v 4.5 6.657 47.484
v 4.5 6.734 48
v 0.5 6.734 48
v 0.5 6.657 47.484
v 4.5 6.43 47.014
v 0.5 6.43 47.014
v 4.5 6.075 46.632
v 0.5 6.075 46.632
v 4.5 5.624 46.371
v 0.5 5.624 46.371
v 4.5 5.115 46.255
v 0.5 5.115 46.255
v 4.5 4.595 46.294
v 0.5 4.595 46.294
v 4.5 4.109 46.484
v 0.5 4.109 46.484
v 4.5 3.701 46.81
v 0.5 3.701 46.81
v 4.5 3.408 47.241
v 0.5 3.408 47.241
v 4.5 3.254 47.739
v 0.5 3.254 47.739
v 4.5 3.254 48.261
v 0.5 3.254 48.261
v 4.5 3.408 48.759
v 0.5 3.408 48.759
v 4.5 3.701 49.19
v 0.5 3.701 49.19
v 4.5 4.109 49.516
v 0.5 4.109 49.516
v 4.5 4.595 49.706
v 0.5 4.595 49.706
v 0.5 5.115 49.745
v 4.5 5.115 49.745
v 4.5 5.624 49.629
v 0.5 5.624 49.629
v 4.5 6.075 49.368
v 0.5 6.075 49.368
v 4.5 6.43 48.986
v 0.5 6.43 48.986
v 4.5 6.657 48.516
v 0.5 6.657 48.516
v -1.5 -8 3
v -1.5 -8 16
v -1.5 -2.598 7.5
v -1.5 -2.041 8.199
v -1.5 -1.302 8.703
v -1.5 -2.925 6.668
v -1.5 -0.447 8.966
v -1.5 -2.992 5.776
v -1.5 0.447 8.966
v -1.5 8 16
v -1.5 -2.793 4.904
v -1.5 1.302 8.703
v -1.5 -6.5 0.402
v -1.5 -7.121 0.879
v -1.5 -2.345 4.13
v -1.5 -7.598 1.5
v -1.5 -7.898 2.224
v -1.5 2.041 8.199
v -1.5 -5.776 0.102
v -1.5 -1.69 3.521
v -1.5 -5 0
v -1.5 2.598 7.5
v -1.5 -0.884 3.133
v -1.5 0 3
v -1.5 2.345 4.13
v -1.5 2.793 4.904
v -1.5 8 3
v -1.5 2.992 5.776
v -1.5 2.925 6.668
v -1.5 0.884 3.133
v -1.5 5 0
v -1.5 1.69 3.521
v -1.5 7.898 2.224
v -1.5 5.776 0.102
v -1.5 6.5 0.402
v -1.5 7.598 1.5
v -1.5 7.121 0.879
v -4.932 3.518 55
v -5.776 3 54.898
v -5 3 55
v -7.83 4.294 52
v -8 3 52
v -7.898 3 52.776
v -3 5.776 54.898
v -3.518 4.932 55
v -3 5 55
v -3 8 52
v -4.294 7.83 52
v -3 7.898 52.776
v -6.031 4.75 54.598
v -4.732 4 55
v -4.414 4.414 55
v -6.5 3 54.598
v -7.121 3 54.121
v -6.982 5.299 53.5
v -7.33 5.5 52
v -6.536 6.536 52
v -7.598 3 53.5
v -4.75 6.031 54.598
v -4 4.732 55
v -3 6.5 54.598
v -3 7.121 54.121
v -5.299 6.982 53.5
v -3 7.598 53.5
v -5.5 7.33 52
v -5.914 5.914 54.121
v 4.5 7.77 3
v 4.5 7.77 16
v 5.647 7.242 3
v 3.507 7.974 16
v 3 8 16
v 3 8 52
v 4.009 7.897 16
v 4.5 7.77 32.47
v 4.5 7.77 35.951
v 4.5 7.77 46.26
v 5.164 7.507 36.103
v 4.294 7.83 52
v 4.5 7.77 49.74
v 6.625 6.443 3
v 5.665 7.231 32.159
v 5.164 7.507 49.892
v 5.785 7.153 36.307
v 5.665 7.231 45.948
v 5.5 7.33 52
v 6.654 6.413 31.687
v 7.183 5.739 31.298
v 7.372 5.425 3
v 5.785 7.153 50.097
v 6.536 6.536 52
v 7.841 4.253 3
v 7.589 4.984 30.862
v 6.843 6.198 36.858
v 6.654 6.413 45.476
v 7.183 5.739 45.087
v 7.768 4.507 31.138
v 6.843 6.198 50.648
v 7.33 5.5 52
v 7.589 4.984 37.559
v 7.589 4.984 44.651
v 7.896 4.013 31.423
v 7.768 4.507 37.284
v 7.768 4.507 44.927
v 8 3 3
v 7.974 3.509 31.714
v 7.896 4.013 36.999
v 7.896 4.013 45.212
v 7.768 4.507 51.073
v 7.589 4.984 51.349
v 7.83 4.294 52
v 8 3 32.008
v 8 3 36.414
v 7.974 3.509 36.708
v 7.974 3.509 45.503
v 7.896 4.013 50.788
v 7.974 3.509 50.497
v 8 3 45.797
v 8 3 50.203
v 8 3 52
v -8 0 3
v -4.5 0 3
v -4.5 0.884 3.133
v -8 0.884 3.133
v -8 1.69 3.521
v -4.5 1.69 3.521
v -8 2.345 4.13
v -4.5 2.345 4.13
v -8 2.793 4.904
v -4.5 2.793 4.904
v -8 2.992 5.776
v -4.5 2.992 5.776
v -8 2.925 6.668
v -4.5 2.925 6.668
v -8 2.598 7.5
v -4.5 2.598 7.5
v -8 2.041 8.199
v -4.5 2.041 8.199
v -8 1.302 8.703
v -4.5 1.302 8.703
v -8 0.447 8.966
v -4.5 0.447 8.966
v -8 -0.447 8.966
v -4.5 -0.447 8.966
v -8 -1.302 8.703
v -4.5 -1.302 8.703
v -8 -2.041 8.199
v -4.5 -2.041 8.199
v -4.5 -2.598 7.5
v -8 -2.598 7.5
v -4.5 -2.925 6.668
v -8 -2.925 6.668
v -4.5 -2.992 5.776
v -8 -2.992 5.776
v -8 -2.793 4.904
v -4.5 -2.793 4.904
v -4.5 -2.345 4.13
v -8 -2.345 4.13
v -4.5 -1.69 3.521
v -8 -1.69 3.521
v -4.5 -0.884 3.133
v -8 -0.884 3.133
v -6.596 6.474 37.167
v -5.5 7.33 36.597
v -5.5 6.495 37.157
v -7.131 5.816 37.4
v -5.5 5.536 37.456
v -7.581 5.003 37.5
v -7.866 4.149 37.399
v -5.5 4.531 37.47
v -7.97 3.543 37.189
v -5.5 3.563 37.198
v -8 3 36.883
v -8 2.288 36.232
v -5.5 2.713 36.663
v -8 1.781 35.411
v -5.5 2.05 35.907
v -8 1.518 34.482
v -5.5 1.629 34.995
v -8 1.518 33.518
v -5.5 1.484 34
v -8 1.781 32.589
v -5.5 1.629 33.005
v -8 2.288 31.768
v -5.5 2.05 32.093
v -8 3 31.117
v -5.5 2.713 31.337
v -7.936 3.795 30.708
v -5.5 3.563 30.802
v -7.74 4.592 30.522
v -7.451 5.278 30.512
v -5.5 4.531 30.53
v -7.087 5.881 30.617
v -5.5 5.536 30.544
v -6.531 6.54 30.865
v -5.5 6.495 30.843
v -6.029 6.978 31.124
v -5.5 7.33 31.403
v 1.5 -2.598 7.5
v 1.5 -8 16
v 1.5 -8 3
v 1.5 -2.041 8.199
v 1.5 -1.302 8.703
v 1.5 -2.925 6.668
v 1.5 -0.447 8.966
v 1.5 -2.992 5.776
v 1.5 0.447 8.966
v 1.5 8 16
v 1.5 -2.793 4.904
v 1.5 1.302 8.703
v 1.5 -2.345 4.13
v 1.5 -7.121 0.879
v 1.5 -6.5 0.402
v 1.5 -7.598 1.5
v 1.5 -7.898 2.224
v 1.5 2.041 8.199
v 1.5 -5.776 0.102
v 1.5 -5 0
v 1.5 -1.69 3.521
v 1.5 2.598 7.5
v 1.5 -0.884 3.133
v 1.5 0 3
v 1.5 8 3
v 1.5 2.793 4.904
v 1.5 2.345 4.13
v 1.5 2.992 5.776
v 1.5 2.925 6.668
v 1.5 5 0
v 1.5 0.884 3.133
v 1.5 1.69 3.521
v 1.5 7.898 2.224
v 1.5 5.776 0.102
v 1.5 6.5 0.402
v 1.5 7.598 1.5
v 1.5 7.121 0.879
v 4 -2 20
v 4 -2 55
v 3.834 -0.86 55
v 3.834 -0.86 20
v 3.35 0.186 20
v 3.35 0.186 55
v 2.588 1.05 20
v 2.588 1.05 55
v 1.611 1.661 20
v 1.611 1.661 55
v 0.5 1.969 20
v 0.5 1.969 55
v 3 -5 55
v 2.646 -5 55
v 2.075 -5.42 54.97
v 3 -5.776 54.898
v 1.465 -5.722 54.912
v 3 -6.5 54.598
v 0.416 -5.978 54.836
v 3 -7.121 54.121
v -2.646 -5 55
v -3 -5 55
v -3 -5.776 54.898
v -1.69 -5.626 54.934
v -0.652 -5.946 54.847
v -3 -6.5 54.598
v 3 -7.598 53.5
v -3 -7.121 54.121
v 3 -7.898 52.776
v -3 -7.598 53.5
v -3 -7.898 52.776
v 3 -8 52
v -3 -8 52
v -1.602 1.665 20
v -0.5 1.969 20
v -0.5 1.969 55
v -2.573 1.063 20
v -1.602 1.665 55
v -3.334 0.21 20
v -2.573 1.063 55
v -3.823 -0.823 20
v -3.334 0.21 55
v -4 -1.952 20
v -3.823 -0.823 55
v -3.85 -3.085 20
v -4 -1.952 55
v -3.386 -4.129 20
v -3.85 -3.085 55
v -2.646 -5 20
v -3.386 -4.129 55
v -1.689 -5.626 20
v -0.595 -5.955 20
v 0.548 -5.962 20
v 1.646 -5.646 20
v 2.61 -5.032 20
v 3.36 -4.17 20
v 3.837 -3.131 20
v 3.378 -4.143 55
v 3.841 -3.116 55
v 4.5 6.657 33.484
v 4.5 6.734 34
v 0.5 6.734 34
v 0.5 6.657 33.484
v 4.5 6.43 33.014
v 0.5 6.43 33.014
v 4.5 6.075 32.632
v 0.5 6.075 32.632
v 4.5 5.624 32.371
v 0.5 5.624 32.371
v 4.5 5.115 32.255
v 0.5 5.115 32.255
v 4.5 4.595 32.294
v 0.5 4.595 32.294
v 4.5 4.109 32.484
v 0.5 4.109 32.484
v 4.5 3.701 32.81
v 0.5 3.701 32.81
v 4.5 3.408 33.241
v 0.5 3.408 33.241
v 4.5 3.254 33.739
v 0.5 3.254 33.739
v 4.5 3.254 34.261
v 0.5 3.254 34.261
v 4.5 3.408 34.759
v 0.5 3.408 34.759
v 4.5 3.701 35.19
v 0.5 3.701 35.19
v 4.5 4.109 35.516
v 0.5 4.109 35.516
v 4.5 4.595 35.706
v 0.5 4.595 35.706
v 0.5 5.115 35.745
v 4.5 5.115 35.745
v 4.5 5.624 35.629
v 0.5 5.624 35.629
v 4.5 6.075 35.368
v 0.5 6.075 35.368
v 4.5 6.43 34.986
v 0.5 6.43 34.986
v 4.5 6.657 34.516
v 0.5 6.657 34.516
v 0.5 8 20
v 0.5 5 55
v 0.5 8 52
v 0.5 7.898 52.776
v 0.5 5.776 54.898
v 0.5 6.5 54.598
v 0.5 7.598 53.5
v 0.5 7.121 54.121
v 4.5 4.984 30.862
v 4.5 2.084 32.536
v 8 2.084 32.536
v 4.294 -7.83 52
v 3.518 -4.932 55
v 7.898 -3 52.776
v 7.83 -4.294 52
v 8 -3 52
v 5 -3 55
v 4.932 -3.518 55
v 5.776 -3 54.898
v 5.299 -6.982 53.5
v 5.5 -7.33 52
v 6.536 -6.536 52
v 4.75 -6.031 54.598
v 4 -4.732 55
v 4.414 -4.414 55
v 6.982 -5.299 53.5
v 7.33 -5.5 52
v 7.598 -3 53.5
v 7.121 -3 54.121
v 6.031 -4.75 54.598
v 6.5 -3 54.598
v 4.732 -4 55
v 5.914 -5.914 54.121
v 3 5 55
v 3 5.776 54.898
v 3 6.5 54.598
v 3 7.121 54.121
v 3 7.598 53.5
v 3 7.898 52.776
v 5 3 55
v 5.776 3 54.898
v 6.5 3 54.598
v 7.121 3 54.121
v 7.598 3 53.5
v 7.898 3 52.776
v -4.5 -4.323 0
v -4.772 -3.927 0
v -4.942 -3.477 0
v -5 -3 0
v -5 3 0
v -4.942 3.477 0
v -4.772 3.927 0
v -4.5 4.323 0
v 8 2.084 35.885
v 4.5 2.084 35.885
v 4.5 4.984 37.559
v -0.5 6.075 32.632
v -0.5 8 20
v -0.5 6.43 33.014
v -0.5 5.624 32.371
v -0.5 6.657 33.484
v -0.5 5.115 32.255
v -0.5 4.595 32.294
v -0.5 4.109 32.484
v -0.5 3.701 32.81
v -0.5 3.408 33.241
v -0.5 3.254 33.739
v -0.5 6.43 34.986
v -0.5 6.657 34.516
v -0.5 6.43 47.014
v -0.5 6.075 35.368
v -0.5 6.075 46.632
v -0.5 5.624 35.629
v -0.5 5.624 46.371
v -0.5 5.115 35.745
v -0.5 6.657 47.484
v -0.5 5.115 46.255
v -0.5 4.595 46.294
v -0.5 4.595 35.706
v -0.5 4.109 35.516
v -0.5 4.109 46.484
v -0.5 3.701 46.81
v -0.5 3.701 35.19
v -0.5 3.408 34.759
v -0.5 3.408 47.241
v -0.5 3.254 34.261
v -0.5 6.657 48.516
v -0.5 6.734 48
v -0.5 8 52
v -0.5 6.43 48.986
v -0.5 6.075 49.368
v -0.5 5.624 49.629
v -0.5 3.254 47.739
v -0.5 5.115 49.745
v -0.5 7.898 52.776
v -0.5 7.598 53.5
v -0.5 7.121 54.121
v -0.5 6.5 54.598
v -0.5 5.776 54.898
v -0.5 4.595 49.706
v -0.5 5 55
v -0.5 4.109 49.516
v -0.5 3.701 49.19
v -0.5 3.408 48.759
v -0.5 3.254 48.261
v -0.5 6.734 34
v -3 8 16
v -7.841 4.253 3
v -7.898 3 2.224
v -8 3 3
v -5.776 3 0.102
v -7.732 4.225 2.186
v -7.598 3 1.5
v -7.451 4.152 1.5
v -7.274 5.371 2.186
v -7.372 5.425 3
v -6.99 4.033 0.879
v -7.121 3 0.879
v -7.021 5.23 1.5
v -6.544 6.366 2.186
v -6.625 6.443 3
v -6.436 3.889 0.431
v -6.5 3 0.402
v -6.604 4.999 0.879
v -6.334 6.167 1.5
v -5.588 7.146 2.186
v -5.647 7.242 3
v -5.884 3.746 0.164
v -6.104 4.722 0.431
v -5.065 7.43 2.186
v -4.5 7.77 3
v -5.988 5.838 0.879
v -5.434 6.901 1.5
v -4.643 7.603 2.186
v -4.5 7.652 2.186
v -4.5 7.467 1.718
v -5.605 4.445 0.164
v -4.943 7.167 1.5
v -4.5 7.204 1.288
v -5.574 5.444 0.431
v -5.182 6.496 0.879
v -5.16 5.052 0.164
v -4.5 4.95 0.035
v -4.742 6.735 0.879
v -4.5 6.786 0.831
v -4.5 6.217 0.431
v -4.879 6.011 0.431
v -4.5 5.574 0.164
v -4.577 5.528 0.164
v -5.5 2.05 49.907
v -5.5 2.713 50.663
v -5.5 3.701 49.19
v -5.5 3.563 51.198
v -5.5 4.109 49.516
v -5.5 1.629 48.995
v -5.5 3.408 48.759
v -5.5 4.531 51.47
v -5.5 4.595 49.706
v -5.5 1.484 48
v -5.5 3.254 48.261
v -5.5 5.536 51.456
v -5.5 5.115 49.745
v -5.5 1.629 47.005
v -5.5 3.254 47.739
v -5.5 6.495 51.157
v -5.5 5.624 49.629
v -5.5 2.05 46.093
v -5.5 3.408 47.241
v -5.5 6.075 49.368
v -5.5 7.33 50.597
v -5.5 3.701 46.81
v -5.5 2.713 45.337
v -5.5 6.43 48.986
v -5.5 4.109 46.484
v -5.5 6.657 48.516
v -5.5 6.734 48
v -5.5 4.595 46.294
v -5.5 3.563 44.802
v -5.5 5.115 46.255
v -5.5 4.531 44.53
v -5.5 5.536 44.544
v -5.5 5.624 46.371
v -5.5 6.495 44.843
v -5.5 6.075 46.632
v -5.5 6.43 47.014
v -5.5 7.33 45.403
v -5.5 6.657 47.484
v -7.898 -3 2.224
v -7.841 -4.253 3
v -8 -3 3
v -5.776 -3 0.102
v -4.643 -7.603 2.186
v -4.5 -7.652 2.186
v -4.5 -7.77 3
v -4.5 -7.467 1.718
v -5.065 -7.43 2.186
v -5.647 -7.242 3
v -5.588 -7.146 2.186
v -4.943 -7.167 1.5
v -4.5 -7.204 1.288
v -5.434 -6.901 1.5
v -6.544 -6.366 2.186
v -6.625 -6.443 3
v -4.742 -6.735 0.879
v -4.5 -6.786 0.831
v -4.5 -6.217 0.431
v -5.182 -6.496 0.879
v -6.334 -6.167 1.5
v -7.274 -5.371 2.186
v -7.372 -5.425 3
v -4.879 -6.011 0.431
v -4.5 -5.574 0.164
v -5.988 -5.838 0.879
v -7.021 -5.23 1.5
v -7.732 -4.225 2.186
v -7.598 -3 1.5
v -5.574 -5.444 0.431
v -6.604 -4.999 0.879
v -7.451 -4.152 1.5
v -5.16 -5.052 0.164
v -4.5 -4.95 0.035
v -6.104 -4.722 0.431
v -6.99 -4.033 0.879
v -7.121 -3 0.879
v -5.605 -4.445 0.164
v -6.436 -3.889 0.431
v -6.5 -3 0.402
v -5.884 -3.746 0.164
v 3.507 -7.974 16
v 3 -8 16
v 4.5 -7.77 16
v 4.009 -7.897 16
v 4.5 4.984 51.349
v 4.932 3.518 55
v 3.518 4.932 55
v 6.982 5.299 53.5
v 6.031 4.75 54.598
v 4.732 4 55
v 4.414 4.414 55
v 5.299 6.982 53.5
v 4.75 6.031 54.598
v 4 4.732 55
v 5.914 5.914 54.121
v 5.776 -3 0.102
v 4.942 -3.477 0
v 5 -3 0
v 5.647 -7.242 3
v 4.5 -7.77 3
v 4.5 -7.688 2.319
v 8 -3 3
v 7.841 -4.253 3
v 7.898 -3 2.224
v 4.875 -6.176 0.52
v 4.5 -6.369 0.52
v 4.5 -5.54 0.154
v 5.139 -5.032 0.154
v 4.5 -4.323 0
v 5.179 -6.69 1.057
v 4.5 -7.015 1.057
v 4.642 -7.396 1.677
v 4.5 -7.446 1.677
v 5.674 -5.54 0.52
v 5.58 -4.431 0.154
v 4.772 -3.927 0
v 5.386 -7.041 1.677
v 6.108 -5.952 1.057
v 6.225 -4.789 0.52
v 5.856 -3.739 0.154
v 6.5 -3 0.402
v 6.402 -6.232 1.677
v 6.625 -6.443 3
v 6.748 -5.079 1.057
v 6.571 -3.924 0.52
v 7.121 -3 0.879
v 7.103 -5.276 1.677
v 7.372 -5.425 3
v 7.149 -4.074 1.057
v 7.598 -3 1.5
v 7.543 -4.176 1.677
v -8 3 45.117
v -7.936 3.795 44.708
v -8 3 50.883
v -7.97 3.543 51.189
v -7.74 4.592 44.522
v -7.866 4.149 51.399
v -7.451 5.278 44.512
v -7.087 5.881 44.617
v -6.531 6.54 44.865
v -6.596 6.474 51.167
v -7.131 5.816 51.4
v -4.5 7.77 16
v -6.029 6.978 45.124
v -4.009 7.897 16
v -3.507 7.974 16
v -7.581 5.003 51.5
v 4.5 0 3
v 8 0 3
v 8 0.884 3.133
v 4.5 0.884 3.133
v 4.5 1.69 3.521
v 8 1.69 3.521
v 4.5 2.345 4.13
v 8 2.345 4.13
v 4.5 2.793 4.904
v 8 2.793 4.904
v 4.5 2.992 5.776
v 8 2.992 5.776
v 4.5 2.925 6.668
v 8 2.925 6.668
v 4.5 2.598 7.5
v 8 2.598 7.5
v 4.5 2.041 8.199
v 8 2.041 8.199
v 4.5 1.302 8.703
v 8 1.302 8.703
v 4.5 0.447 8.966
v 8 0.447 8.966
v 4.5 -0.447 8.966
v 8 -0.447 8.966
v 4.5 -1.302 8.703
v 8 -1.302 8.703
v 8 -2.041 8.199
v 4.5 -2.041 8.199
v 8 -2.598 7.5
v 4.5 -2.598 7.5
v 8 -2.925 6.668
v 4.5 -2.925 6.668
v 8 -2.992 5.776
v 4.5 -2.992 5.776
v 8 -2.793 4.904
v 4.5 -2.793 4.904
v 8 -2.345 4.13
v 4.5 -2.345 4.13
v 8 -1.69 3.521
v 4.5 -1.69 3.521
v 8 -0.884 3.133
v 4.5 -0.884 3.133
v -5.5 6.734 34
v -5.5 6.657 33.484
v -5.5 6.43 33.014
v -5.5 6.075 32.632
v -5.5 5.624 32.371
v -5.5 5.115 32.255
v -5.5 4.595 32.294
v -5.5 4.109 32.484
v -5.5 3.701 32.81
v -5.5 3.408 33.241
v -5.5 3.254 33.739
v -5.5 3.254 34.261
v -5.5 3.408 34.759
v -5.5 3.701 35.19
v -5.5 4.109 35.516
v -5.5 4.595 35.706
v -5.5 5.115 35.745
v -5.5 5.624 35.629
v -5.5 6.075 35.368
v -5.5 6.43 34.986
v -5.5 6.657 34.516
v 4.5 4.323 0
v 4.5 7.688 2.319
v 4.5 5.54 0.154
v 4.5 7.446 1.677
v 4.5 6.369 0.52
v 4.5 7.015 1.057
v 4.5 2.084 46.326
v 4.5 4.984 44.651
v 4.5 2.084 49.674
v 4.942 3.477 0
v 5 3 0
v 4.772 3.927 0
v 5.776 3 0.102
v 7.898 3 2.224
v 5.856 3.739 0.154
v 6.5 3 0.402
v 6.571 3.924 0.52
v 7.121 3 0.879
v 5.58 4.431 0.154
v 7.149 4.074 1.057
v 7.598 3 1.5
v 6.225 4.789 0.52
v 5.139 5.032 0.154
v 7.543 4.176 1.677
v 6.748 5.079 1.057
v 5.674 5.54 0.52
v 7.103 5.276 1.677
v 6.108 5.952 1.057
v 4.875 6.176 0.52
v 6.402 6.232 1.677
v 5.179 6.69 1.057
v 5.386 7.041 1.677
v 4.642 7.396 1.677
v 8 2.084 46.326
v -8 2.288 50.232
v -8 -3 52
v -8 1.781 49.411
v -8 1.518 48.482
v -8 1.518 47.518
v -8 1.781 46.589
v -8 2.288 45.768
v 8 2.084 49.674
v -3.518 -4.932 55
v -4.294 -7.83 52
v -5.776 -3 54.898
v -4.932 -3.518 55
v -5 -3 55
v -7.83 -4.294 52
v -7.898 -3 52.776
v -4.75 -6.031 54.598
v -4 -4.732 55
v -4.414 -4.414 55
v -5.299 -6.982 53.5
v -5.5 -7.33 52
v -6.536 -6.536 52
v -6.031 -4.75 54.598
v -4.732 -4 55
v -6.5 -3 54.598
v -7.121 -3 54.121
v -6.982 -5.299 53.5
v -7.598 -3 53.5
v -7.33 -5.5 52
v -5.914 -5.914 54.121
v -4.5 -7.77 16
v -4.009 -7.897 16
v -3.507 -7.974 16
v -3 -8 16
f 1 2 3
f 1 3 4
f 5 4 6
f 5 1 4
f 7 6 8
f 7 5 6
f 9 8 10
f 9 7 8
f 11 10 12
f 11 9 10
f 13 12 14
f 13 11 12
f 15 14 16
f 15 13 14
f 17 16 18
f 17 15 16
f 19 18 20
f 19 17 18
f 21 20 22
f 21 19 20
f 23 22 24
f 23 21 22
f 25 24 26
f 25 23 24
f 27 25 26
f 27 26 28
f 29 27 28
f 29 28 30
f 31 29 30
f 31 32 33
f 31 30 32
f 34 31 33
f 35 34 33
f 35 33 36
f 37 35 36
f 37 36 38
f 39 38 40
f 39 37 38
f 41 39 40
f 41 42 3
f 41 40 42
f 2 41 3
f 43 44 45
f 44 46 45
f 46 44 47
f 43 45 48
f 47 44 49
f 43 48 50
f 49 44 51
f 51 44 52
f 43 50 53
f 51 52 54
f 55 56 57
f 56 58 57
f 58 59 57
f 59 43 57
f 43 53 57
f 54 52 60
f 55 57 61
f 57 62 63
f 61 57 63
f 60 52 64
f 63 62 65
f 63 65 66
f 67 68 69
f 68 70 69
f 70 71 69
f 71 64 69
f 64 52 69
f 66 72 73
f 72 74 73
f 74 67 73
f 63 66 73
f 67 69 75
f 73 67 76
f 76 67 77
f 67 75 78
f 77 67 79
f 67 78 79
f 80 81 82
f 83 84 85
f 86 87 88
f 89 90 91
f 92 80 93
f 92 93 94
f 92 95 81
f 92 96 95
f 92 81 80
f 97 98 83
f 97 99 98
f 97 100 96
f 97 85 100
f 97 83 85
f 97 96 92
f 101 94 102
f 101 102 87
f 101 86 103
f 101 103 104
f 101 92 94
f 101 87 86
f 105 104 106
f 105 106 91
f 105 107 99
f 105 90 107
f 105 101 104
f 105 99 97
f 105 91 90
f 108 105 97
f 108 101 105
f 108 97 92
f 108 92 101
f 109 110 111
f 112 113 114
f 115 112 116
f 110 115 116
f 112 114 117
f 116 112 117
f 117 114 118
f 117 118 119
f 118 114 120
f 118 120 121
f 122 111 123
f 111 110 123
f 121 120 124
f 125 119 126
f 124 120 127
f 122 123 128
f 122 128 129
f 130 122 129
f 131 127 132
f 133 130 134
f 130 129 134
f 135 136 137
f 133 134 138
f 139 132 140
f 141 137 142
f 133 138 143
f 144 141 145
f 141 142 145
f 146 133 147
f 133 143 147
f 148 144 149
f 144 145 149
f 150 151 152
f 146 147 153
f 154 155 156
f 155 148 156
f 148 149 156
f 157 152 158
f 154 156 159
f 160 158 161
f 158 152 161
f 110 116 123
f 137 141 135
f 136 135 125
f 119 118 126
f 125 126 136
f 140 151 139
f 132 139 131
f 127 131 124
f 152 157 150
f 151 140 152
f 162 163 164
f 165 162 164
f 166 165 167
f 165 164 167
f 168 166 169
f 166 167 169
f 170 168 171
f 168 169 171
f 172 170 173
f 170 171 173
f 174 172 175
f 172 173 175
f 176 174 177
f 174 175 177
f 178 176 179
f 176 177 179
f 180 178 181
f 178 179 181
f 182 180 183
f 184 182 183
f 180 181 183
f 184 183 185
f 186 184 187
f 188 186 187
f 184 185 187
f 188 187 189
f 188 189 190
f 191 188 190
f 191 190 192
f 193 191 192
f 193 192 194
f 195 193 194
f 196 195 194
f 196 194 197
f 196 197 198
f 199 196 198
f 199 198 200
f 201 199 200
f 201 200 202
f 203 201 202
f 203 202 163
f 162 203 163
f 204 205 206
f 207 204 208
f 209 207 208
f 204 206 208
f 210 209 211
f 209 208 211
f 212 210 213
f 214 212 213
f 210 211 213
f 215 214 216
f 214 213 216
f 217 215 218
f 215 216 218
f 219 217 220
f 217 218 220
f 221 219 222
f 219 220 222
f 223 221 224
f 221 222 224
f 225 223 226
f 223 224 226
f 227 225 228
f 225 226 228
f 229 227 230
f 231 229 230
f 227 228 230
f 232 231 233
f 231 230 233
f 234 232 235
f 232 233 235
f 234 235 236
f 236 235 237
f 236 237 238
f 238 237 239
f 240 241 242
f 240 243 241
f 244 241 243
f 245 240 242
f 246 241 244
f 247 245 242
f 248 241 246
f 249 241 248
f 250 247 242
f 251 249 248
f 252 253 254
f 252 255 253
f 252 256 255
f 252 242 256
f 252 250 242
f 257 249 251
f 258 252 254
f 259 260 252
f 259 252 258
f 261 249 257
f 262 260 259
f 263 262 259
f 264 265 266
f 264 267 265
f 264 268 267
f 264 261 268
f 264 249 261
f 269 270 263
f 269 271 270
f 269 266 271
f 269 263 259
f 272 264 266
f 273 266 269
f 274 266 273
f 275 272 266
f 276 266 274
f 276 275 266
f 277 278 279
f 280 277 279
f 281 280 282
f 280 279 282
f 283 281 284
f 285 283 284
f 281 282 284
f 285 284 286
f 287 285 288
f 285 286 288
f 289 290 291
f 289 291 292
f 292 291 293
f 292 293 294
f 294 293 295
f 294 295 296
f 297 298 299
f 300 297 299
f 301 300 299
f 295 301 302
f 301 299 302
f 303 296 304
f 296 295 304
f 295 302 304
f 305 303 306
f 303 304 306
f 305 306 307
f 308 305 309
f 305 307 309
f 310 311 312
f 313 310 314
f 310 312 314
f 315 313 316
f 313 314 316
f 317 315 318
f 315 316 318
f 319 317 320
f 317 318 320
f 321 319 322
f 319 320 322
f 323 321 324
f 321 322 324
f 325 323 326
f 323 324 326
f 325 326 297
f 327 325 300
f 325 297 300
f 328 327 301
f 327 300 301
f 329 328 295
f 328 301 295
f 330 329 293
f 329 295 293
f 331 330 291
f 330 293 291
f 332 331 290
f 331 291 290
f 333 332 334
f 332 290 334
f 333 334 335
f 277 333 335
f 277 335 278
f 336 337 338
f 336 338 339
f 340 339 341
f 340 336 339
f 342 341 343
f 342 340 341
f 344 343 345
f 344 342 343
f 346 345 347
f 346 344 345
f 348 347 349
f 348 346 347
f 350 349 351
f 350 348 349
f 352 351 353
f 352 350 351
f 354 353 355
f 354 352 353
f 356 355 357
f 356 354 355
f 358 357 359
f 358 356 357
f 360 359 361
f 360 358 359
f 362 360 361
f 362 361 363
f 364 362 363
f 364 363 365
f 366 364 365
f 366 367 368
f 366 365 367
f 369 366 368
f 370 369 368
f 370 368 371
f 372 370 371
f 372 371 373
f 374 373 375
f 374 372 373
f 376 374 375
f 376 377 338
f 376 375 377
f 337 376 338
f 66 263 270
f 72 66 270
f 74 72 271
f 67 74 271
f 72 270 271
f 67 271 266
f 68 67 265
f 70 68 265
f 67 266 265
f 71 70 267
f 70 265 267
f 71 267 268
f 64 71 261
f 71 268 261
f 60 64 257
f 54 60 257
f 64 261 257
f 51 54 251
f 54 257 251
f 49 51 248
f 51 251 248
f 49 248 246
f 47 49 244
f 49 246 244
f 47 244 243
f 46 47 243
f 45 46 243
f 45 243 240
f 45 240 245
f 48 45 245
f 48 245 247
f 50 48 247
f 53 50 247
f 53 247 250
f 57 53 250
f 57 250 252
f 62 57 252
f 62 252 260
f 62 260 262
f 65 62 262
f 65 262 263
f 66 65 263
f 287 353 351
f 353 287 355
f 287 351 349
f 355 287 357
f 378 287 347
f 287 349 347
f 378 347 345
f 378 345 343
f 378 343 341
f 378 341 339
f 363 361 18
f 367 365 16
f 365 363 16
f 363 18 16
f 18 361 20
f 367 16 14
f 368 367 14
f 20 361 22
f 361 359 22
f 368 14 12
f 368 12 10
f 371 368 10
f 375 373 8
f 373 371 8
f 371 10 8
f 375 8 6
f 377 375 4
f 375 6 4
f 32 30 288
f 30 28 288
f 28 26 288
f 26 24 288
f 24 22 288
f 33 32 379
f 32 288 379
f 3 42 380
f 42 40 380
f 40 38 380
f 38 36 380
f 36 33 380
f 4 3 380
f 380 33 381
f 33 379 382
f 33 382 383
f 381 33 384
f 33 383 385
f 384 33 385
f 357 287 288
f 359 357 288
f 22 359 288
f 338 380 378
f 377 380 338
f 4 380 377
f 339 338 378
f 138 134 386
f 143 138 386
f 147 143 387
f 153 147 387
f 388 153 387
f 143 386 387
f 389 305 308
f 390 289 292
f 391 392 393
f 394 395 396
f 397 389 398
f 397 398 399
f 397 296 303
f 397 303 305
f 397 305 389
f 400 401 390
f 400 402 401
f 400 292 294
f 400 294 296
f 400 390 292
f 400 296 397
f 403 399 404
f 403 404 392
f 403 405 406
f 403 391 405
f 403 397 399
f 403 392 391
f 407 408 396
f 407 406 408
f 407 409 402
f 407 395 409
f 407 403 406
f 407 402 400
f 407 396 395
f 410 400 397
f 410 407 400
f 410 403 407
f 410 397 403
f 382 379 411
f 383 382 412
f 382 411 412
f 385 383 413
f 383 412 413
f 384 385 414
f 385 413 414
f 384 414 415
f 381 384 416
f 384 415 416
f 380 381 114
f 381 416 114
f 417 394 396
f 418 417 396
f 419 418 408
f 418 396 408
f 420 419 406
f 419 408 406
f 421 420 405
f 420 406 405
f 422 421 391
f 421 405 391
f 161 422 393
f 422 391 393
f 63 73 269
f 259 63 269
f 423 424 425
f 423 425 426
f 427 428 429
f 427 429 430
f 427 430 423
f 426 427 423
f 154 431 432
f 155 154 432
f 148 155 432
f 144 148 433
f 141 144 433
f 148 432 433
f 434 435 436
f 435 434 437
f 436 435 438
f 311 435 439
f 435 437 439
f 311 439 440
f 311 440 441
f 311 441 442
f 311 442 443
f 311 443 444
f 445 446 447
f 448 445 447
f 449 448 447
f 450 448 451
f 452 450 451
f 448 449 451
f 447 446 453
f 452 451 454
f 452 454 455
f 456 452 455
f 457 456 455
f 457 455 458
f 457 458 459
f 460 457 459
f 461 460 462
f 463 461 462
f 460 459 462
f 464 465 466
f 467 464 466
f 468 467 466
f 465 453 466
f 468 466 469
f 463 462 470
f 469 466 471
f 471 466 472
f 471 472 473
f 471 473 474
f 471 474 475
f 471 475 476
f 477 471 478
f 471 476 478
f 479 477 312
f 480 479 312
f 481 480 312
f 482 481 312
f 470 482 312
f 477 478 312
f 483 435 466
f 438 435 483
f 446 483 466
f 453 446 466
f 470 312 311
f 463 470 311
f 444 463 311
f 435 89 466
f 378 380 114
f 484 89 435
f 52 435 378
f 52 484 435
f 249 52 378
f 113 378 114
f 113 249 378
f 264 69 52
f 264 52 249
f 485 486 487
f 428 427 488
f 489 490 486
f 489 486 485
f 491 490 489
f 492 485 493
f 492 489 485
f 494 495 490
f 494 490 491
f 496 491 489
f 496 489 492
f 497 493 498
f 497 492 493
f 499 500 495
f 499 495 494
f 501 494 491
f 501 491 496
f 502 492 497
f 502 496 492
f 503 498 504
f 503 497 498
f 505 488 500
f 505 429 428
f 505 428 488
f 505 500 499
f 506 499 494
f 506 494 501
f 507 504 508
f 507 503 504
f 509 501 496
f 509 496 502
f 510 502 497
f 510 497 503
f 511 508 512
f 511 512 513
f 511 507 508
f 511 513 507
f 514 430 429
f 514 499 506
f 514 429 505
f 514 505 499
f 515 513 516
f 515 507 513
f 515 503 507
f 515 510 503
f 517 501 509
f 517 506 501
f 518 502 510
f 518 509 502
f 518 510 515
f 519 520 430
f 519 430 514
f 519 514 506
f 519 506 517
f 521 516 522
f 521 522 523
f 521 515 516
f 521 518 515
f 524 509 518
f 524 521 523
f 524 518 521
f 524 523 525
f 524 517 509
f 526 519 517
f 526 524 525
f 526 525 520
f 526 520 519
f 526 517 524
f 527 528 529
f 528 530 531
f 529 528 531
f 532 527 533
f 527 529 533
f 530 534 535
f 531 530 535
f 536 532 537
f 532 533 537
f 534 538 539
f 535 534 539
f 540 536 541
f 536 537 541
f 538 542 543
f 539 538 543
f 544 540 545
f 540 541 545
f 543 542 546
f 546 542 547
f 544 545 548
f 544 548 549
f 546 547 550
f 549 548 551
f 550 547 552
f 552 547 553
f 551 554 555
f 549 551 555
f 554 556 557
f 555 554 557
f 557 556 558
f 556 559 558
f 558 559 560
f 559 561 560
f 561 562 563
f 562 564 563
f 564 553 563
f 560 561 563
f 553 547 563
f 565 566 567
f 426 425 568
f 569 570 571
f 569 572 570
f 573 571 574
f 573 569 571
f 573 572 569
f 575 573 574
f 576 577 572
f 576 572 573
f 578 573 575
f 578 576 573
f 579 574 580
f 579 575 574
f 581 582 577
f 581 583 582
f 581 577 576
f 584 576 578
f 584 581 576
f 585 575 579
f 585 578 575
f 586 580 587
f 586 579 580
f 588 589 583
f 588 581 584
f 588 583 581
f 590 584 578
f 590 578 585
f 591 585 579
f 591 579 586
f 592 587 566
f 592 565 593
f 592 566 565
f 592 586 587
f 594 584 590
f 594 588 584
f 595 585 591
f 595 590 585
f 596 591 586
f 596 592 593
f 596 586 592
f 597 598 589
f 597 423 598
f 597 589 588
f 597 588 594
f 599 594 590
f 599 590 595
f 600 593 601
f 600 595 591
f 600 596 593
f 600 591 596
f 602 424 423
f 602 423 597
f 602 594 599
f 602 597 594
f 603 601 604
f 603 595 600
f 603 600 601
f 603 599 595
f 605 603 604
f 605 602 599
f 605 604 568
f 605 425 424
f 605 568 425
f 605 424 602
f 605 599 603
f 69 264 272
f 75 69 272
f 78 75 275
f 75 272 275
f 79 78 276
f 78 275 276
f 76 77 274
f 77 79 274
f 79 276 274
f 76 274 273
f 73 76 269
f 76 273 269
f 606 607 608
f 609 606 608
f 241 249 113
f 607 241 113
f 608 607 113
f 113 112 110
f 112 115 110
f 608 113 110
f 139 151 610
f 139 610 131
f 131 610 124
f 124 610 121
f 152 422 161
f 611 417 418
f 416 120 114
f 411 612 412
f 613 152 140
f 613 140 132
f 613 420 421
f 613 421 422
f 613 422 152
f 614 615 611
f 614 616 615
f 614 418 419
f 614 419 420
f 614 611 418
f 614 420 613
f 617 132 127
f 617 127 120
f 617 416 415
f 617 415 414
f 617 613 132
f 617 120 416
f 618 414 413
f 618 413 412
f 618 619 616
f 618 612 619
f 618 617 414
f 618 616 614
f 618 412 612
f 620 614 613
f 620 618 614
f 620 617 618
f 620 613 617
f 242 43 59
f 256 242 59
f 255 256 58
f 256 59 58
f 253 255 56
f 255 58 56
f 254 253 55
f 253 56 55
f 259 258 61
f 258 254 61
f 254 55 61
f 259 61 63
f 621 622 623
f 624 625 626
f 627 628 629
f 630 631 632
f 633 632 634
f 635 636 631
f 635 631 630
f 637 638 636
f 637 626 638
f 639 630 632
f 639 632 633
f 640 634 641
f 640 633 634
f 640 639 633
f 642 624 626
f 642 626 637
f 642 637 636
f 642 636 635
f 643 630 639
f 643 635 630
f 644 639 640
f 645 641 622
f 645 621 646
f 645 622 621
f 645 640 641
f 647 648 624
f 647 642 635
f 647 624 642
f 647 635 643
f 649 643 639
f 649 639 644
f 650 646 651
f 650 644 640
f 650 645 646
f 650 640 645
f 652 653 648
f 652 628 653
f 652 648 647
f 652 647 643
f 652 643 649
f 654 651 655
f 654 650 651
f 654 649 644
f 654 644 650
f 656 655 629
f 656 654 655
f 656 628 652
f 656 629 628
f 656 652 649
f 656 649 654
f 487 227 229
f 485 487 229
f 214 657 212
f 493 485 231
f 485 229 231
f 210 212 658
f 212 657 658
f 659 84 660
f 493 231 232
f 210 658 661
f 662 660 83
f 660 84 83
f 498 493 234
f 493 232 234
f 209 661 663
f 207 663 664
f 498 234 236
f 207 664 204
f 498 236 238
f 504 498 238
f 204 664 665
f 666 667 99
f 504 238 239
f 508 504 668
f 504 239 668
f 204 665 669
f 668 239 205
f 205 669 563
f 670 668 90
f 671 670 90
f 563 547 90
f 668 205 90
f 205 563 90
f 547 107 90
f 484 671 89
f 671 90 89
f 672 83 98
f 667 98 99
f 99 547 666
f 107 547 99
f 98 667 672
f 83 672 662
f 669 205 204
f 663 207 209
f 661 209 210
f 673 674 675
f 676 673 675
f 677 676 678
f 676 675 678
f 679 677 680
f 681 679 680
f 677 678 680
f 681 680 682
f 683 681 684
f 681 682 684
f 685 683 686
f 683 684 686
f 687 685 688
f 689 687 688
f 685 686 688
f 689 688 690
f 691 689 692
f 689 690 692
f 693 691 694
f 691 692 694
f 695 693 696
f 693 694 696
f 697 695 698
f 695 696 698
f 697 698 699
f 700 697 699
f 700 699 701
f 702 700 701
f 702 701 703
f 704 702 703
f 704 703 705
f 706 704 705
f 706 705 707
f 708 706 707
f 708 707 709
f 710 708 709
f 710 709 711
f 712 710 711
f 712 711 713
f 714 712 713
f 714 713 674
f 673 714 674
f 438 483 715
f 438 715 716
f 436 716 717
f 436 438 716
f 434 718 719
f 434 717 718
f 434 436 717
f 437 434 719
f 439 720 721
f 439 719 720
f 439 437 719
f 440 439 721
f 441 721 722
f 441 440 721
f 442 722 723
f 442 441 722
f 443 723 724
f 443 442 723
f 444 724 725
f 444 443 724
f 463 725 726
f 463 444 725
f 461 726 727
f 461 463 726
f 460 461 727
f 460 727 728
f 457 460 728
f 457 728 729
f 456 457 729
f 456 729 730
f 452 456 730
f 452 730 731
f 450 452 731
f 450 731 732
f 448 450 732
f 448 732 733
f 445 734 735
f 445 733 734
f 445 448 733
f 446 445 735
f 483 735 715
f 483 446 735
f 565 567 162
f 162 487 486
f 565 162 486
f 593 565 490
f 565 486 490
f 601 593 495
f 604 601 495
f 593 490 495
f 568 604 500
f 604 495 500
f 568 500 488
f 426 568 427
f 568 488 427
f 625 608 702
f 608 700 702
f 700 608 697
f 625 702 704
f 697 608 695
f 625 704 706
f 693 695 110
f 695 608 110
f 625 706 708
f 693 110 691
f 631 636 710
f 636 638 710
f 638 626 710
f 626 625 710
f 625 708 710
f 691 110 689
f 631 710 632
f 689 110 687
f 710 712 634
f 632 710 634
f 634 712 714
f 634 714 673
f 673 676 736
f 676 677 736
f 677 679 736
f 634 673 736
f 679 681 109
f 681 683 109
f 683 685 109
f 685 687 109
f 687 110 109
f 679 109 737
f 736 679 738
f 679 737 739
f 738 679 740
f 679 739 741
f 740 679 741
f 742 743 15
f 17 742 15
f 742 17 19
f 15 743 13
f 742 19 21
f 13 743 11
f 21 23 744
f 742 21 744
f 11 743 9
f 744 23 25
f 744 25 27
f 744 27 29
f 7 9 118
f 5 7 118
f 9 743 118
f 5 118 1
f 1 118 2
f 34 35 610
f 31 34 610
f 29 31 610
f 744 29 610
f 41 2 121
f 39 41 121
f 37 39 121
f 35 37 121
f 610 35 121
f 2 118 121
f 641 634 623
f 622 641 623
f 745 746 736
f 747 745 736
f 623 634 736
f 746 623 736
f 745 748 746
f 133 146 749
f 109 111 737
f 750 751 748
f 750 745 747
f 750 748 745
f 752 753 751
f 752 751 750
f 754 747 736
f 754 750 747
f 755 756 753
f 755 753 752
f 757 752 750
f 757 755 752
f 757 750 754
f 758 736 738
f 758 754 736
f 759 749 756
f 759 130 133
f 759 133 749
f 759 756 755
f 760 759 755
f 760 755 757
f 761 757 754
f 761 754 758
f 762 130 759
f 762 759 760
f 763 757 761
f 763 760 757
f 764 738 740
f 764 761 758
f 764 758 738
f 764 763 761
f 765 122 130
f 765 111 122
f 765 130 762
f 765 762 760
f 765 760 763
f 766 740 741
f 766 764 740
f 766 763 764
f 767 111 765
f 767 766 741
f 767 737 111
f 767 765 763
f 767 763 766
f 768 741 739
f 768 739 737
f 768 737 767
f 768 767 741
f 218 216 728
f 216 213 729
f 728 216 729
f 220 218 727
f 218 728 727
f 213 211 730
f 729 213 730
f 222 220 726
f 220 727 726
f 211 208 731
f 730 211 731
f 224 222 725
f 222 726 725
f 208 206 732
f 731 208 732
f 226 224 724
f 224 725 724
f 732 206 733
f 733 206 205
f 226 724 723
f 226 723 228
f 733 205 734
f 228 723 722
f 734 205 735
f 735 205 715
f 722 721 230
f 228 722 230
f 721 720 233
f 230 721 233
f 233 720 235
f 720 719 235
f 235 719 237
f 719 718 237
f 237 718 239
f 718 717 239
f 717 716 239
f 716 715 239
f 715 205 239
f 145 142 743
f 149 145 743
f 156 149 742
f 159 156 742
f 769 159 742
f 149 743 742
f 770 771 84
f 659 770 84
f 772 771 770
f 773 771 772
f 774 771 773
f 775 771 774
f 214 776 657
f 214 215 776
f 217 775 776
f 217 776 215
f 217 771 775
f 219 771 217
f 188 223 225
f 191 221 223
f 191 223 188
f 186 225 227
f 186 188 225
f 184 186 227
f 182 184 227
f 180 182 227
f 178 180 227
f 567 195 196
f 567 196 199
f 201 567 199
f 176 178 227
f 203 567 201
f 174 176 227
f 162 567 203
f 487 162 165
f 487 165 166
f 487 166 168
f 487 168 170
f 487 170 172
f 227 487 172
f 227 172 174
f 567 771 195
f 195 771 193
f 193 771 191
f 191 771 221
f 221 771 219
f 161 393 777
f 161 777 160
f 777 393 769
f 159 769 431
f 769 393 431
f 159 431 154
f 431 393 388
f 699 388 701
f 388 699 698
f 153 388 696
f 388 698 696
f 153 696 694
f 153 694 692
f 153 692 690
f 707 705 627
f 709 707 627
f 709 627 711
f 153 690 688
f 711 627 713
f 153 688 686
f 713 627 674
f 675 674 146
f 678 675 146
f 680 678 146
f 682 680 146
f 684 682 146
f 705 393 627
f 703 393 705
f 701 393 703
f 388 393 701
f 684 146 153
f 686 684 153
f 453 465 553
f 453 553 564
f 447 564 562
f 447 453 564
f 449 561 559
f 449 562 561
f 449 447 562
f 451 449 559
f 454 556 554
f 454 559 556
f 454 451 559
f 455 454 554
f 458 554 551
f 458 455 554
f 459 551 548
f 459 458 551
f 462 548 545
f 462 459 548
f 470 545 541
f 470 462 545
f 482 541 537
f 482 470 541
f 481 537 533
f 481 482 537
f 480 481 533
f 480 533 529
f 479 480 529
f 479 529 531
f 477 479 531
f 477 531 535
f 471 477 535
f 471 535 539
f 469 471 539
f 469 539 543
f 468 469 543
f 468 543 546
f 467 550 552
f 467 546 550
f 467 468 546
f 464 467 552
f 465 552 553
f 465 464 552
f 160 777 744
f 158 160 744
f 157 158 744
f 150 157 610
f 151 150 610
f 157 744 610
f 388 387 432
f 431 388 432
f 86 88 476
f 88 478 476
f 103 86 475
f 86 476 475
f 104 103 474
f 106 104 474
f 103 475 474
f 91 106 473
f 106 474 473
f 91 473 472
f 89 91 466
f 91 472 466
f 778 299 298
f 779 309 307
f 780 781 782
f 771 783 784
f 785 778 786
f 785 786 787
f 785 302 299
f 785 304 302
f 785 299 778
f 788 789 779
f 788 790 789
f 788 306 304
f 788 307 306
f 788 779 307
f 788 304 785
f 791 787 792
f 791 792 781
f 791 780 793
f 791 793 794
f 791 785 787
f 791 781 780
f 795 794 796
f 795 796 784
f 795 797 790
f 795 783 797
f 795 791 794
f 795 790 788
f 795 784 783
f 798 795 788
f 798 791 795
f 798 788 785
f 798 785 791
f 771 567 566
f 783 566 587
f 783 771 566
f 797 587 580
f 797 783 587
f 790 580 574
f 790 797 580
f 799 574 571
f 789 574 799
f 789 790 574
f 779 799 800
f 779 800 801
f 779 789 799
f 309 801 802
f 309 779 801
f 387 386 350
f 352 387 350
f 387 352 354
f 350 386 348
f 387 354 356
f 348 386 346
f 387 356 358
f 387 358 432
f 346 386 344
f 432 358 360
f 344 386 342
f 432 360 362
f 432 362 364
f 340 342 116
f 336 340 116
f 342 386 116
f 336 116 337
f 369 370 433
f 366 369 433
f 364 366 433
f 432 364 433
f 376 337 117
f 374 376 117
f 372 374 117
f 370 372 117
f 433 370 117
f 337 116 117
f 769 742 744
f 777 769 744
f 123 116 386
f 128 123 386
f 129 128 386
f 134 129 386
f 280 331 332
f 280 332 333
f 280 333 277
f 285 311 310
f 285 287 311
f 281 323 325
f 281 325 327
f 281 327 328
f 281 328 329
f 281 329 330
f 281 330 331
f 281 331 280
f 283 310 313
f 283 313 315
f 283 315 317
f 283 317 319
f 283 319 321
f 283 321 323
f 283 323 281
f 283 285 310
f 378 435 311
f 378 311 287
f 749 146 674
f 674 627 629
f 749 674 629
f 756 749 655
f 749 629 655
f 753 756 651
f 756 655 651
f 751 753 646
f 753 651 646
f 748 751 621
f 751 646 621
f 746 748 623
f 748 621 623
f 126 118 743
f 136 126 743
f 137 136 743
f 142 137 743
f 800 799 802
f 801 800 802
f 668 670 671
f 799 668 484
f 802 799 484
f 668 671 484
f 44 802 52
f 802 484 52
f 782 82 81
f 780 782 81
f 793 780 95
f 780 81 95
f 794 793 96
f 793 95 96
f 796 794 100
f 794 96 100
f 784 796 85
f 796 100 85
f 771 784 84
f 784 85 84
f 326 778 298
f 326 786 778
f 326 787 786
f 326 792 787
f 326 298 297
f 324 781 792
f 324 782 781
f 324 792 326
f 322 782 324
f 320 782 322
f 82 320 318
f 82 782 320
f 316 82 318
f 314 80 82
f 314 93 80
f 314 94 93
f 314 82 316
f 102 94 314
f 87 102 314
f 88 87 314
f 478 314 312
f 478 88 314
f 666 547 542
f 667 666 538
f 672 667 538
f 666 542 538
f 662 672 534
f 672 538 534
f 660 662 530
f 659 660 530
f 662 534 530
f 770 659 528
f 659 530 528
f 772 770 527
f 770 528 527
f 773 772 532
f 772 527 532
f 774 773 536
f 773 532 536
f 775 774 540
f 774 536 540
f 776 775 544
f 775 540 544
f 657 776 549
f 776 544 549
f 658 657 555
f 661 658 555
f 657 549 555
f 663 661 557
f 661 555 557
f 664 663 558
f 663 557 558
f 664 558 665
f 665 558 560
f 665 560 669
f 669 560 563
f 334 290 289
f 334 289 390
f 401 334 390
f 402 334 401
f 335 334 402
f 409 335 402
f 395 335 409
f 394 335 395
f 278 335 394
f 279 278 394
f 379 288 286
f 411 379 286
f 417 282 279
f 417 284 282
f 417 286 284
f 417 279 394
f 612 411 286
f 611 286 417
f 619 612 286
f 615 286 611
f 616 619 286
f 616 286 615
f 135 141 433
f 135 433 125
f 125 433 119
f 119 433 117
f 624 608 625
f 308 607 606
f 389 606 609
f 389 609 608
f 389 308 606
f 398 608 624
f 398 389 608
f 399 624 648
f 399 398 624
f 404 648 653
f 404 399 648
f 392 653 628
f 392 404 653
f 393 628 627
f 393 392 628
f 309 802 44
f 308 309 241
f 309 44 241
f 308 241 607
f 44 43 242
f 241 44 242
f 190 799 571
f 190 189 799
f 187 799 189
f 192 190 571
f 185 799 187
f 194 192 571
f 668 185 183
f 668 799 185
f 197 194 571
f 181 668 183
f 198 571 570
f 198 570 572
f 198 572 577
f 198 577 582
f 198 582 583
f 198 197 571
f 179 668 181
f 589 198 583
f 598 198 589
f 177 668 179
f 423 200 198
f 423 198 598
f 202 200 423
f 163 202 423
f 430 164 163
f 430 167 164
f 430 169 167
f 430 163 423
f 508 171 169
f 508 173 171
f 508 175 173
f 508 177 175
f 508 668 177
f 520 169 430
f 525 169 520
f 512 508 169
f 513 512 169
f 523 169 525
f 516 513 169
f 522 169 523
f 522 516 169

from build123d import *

# Parameters (mm, degrees)
SKETCH1_W               = 16
SKETCH1_H               = 16
BOSS_EXTRUDE1_DEPTH     = 55
SKETCH2_W               = 3
SKETCH2_H               = 16
CUT_EXTRUDE1_DEPTH      = 45
SKETCH3_R               = 3
CUT_EXTRUDE2_DEPTH      = 45
CUT_EXTRUDE3_DEPTH      = 35
FILLET1_R               = 5
FILLET2_R               = 3
CUT_EXTRUDE4_DEPTH      = 40
CUT_EXTRUDE4_DEPTH_BACK = 40
SKETCH5_R               = 1.75
CUT_EXTRUDE5_START      = -4
CUT_EXTRUDE5_DEPTH      = 40
CUT_EXTRUDE6_START      = -5
SKETCH7_R               = 3.5
CUT_EXTRUDE6_DEPTH      = 40


# Some blends are built 0.0001 mm under size
with BuildPart() as part:
    # Sketch1 → Boss-Extrude1 (new body)
    with BuildSketch(Plane.XY):
        Rectangle(SKETCH1_W, SKETCH1_H)
    extrude(amount=BOSS_EXTRUDE1_DEPTH)

    # Sketch2 → Cut-Extrude1 (cut)
    with BuildSketch(Plane(origin=(0, 8, 0), x_dir=(1, 0, 0), z_dir=(0, 1, 0))):
        with Locations((3, -8)):
            Rectangle(SKETCH2_W, SKETCH2_H)
        with Locations((-3, -8)):
            Rectangle(SKETCH2_W, SKETCH2_H)
    extrude(amount=-CUT_EXTRUDE1_DEPTH, mode=Mode.SUBTRACT)

    # Sketch3 → Cut-Extrude2 (cut)
    with BuildSketch(Plane(origin=(8, 0, 0), x_dir=(0, 0, -1), z_dir=(1, 0, 0))):
        with Locations((-6, 0)):
            Circle(SKETCH3_R)
    extrude(amount=-CUT_EXTRUDE2_DEPTH, mode=Mode.SUBTRACT)

    # Sketch4 → Cut-Extrude3 (cut)
    with BuildSketch(Plane.XY.offset(55)):
        with BuildLine():
            Line((0.5, 1.968626967), (0.5, 0.424558432))
            Line((0.5, 0.424558432), (-0.5, 0.424558432))
            Line((-0.5, 0.424558432), (-0.5, 1.968626967))
            ThreePointArc((-0.5, 1.968626967), (-2.645751311, -5), (4, -2))
            ThreePointArc((4, -2), (3, 0.645751311), (0.5, 1.968626967))
        make_face()
        with BuildLine():
            Line((-0.5, 0.424558432), (0.5, 0.424558432))
            Line((0.5, 0.424558432), (0.5, 1.968626967))
            ThreePointArc((0.5, 1.968626967), (0, 2), (-0.5, 1.968626967))
            Line((-0.5, 1.968626967), (-0.5, 0.424558432))
        make_face()
        with BuildLine():
            ThreePointArc((-0.5, 1.968626967), (0, 2), (0.5, 1.968626967))
            Line((0.5, 1.968626967), (0.5, 8))
            Line((0.5, 8), (-0.5, 8))
            Line((-0.5, 8), (-0.5, 1.968626967))
        make_face()
    extrude(amount=-CUT_EXTRUDE3_DEPTH, mode=Mode.SUBTRACT)

    # Fillet1
    fillet1_edges = [part.edges().sort_by_distance(p)[0] for p in [
        (8, 8, 27.5),
        (-8, 8, 27.5),
        (8, -8, 27.5),
        (-8, -8, 27.5),
    ]]
    fillet(fillet1_edges, radius=FILLET1_R - 0.0001)  # a hair under: the kernel refuses the full size

    # Fillet2
    # the kernel refuses this fillet: 3 mm, written as the material it takes off along each edge
    with BuildSketch(Plane(origin=(9, 8, 0), x_dir=(0, -1, 0), z_dir=(-1, 0, 0))) as fillet2_piece_1:
        with BuildLine():
            CenterArc((FILLET2_R, FILLET2_R), FILLET2_R, 180, 90)
            Line((0, FILLET2_R), (0, 0))
            Line((0, 0), (FILLET2_R, 0))
        make_face()
    extrude(amount=18, mode=Mode.SUBTRACT)
    with BuildSketch(Plane(origin=(-9, -8, 0), x_dir=(0, 0, 1), z_dir=(1, 0, 0))) as fillet2_piece_2:
        with BuildLine():
            CenterArc((FILLET2_R, -FILLET2_R), FILLET2_R, 90, 90)
            Line((0, -FILLET2_R), (0, 0))
            Line((0, 0), (FILLET2_R, 0))
        make_face()
    extrude(amount=18, mode=Mode.SUBTRACT)
    with BuildSketch(Plane(origin=(7, 8, 55), x_dir=(0, -1, 0), z_dir=(-1, 0, 0)), Plane(origin=(3.0001, 8, 55), x_dir=(0, -1, 0), z_dir=(-1, 0, 0))) as fillet2_piece_3:
        with BuildLine():
            CenterArc((FILLET2_R, -FILLET2_R), FILLET2_R, 90, 90)
            Line((0, -FILLET2_R), (0, 0))
            Line((0, 0), (FILLET2_R, 0))
        make_face()
    extrude(amount=10.0001, mode=Mode.SUBTRACT)
    with BuildSketch(Plane(origin=(8, -3.0001, 0), x_dir=(0, 0, 1), z_dir=(0, 1, 0)), Plane(origin=(8, -3.0001, 55), x_dir=(-1, 0, 0), z_dir=(0, 1, 0)), Plane(origin=(-8, 3.0001, 55), x_dir=(1, 0, 0), z_dir=(0, -1, 0))) as fillet2_piece_4:
        with BuildLine():
            CenterArc((FILLET2_R, -FILLET2_R), FILLET2_R, 90, 90)
            Line((0, -FILLET2_R), (0, 0))
            Line((0, 0), (FILLET2_R, 0))
        make_face()
    extrude(amount=6.0002, mode=Mode.SUBTRACT)
    with BuildSketch(Plane(origin=(3.0001, -3.0001, 0), x_dir=(-0.9304882617806061, -0.36632170927820573, 0), z_dir=(-0.36632170927820573, 0.9304882617806061, 0))) as fillet2_piece_5_section:
        with BuildLine():
            CenterArc((4.9999 - FILLET2_R, FILLET2_R), FILLET2_R, 270, 90)
            Line((4.9999 - FILLET2_R, 0), (4.9999, 0))
            Line((4.9999, 0), (4.9999, FILLET2_R))
        make_face()
    fillet2_piece_5 = revolve(axis=Axis((3.0001, -3.0001, 0), (0, 0, 1)), revolution_arc=158.511054393, mode=Mode.PRIVATE)
    fillet2_piece_5 = split(fillet2_piece_5, bisect_by=Plane(origin=(4.5, -5.386535126, 0.726343335), z_dir=(1, 0, 0)), keep=Keep.TOP, mode=Mode.PRIVATE)
    add(fillet2_piece_5, mode=Mode.SUBTRACT)
    with BuildSketch(Plane(origin=(3.0001, 3.0001, 0), x_dir=(1, 0, 0), z_dir=(0, -1, 0))) as fillet2_piece_6_section:
        with BuildLine():
            CenterArc((4.9999 - FILLET2_R, FILLET2_R), FILLET2_R, 270, 90)
            Line((4.9999 - FILLET2_R, 0), (4.9999, 0))
            Line((4.9999, 0), (4.9999, FILLET2_R))
        make_face()
    fillet2_piece_6 = revolve(axis=Axis((3.0001, 3.0001, 0), (0, 0, 1)), revolution_arc=158.511054393, mode=Mode.PRIVATE)
    fillet2_piece_6 = split(fillet2_piece_6, bisect_by=Plane(origin=(4.5, 5.386535107, 0.726343714), z_dir=(1, 0, 0)), keep=Keep.TOP, mode=Mode.PRIVATE)
    add(fillet2_piece_6, mode=Mode.SUBTRACT)
    with BuildSketch(Plane(origin=(-3.0001, -8, 55), x_dir=(0, 0, -1), z_dir=(1, 0, 0)), Plane(origin=(-8, 3.0001, 0), x_dir=(1, 0, 0), z_dir=(0, -1, 0))) as fillet2_piece_7:
        with BuildLine():
            CenterArc((FILLET2_R, FILLET2_R), FILLET2_R, 180, 90)
            Line((0, FILLET2_R), (0, 0))
            Line((0, 0), (FILLET2_R, 0))
        make_face()
    extrude(amount=6.0002, mode=Mode.SUBTRACT)
    with BuildSketch(Plane(origin=(-3.0001, -3.0001, 55), x_dir=(0, -1, 0), z_dir=(1, 0, 0))) as fillet2_piece_8:
        with BuildLine():
            CenterArc((4.9999 - FILLET2_R, FILLET2_R), FILLET2_R, 270, 90)
            Line((4.9999 - FILLET2_R, 0), (4.9999, 0))
            Line((4.9999, 0), (4.9999, FILLET2_R))
        make_face()
    revolve(axis=Axis((-3.0001, -3.0001, 55), (0, 0, -1)), revolution_arc=90, mode=Mode.SUBTRACT)
    with BuildSketch(Plane(origin=(3.0001, -3.0001, 55), x_dir=(0, -1, 0), z_dir=(-1, 0, 0))) as fillet2_piece_9:
        with BuildLine():
            CenterArc((4.9999 - FILLET2_R, -FILLET2_R), FILLET2_R, 0, 90)
            Line((4.9999, -FILLET2_R), (4.9999, 0))
            Line((4.9999, 0), (4.9999 - FILLET2_R, 0))
        make_face()
    revolve(axis=Axis((3.0001, -3.0001, 55), (0, 0, 1)), revolution_arc=90, mode=Mode.SUBTRACT)
    with BuildSketch(Plane(origin=(-3.0001, 3.0001, 55), x_dir=(-1, 0, 0), z_dir=(0, -1, 0))) as fillet2_piece_10:
        with BuildLine():
            CenterArc((4.9999 - FILLET2_R, FILLET2_R), FILLET2_R, 270, 90)
            Line((4.9999, FILLET2_R), (4.9999, 0))
            Line((4.9999, 0), (4.9999 - FILLET2_R, 0))
        make_face()
    revolve(axis=Axis((-3.0001, 3.0001, 55), (0, 0, -1)), revolution_arc=90, mode=Mode.SUBTRACT)
    with BuildSketch(Plane(origin=(3.0001, 3.0001, 55), x_dir=(1, 0, 0), z_dir=(0, -1, 0))) as fillet2_piece_11:
        with BuildLine():
            CenterArc((4.9999 - FILLET2_R, -FILLET2_R), FILLET2_R, 0, 90)
            Line((4.9999, -FILLET2_R), (4.9999, 0))
            Line((4.9999, 0), (4.9999 - FILLET2_R, 0))
        make_face()
    revolve(axis=Axis((3.0001, 3.0001, 55), (0, 0, 1)), revolution_arc=90, mode=Mode.SUBTRACT)
    with BuildSketch(Plane(origin=(-3.0001, -3.0001, 0), x_dir=(0.9304882617806057, -0.3663217092782066, 0), z_dir=(0.3663217092782066, 0.9304882617806057, 0))) as fillet2_piece_12_section:
        with BuildLine():
            CenterArc((4.9999 - FILLET2_R, -FILLET2_R), FILLET2_R, 0, 90)
            Line((4.9999 - FILLET2_R, 0), (4.9999, 0))
            Line((4.9999, 0), (4.9999, -FILLET2_R))
        make_face()
    fillet2_piece_12 = revolve(axis=Axis((-3.0001, -3.0001, 0), (0, 0, -1)), revolution_arc=158.511054393, mode=Mode.PRIVATE)
    fillet2_piece_12 = split(fillet2_piece_12, bisect_by=Plane(origin=(-4.5, -5.38653512, 0.72634326), z_dir=(-1, 0, 0)), keep=Keep.TOP, mode=Mode.PRIVATE)
    add(fillet2_piece_12, mode=Mode.SUBTRACT)
    with BuildSketch(Plane(origin=(-3.0001, 3.0001, 0), x_dir=(-1, 0, 0), z_dir=(0, -1, 0))) as fillet2_piece_13_section:
        with BuildLine():
            CenterArc((4.9999 - FILLET2_R, -FILLET2_R), FILLET2_R, 0, 90)
            Line((4.9999 - FILLET2_R, 0), (4.9999, 0))
            Line((4.9999, 0), (4.9999, -FILLET2_R))
        make_face()
    fillet2_piece_13 = revolve(axis=Axis((-3.0001, 3.0001, 0), (0, 0, -1)), revolution_arc=158.511054393, mode=Mode.PRIVATE)
    fillet2_piece_13 = split(fillet2_piece_13, bisect_by=Plane(origin=(-4.5, 5.386535101, 0.726343639), z_dir=(-1, 0, 0)), keep=Keep.TOP, mode=Mode.PRIVATE)
    add(fillet2_piece_13, mode=Mode.SUBTRACT)

    # Sketch5 → Cut-Extrude4 (cut, two sides: drawn at the far end of the back side and taken through both)
    with BuildSketch(Plane.ZY.offset(-0.5).offset(-CUT_EXTRUDE4_DEPTH_BACK)):
        with Locations(Location((48, 4.984313483, 0), (0, 0, 90))):
            Circle(SKETCH5_R)
        with Locations(Location((34, 4.984313483, 0), (0, 0, 90))):
            Circle(SKETCH5_R)
    extrude(amount=CUT_EXTRUDE4_DEPTH + CUT_EXTRUDE4_DEPTH_BACK, mode=Mode.SUBTRACT)

    # Sketch6 → Cut-Extrude5 (cut)
    with BuildSketch(Plane.ZY.offset(-0.5).offset(CUT_EXTRUDE5_START)):
        Polygon((49.674315781, 7.884313483), (46.325684219, 7.884313483), (44.651368439, 4.984313483), (46.325684219, 2.084313483), (49.674315781, 2.084313483), (51.348631561, 4.984313483), align=None)
        Polygon((35.885086056, 7.884313483), (32.536454495, 7.884313483), (30.862138714, 4.984313483), (32.536454495, 2.084313483), (35.885086056, 2.084313483), (37.559401836, 4.984313483), align=None)
    extrude(amount=-CUT_EXTRUDE5_DEPTH, mode=Mode.SUBTRACT)

    # Sketch7 → Cut-Extrude6 (cut)
    with BuildSketch(Plane(origin=(-0.5, 0, 0), x_dir=(0, 0, -1), z_dir=(1, 0, 0)).offset(CUT_EXTRUDE6_START)):
        with Locations((-48, 4.984313483)):
            Circle(SKETCH7_R)
        with Locations((-34, 4.984313483)):
            Circle(SKETCH7_R)
    extrude(amount=-CUT_EXTRUDE6_DEPTH, mode=Mode.SUBTRACT)


solid = part.part
